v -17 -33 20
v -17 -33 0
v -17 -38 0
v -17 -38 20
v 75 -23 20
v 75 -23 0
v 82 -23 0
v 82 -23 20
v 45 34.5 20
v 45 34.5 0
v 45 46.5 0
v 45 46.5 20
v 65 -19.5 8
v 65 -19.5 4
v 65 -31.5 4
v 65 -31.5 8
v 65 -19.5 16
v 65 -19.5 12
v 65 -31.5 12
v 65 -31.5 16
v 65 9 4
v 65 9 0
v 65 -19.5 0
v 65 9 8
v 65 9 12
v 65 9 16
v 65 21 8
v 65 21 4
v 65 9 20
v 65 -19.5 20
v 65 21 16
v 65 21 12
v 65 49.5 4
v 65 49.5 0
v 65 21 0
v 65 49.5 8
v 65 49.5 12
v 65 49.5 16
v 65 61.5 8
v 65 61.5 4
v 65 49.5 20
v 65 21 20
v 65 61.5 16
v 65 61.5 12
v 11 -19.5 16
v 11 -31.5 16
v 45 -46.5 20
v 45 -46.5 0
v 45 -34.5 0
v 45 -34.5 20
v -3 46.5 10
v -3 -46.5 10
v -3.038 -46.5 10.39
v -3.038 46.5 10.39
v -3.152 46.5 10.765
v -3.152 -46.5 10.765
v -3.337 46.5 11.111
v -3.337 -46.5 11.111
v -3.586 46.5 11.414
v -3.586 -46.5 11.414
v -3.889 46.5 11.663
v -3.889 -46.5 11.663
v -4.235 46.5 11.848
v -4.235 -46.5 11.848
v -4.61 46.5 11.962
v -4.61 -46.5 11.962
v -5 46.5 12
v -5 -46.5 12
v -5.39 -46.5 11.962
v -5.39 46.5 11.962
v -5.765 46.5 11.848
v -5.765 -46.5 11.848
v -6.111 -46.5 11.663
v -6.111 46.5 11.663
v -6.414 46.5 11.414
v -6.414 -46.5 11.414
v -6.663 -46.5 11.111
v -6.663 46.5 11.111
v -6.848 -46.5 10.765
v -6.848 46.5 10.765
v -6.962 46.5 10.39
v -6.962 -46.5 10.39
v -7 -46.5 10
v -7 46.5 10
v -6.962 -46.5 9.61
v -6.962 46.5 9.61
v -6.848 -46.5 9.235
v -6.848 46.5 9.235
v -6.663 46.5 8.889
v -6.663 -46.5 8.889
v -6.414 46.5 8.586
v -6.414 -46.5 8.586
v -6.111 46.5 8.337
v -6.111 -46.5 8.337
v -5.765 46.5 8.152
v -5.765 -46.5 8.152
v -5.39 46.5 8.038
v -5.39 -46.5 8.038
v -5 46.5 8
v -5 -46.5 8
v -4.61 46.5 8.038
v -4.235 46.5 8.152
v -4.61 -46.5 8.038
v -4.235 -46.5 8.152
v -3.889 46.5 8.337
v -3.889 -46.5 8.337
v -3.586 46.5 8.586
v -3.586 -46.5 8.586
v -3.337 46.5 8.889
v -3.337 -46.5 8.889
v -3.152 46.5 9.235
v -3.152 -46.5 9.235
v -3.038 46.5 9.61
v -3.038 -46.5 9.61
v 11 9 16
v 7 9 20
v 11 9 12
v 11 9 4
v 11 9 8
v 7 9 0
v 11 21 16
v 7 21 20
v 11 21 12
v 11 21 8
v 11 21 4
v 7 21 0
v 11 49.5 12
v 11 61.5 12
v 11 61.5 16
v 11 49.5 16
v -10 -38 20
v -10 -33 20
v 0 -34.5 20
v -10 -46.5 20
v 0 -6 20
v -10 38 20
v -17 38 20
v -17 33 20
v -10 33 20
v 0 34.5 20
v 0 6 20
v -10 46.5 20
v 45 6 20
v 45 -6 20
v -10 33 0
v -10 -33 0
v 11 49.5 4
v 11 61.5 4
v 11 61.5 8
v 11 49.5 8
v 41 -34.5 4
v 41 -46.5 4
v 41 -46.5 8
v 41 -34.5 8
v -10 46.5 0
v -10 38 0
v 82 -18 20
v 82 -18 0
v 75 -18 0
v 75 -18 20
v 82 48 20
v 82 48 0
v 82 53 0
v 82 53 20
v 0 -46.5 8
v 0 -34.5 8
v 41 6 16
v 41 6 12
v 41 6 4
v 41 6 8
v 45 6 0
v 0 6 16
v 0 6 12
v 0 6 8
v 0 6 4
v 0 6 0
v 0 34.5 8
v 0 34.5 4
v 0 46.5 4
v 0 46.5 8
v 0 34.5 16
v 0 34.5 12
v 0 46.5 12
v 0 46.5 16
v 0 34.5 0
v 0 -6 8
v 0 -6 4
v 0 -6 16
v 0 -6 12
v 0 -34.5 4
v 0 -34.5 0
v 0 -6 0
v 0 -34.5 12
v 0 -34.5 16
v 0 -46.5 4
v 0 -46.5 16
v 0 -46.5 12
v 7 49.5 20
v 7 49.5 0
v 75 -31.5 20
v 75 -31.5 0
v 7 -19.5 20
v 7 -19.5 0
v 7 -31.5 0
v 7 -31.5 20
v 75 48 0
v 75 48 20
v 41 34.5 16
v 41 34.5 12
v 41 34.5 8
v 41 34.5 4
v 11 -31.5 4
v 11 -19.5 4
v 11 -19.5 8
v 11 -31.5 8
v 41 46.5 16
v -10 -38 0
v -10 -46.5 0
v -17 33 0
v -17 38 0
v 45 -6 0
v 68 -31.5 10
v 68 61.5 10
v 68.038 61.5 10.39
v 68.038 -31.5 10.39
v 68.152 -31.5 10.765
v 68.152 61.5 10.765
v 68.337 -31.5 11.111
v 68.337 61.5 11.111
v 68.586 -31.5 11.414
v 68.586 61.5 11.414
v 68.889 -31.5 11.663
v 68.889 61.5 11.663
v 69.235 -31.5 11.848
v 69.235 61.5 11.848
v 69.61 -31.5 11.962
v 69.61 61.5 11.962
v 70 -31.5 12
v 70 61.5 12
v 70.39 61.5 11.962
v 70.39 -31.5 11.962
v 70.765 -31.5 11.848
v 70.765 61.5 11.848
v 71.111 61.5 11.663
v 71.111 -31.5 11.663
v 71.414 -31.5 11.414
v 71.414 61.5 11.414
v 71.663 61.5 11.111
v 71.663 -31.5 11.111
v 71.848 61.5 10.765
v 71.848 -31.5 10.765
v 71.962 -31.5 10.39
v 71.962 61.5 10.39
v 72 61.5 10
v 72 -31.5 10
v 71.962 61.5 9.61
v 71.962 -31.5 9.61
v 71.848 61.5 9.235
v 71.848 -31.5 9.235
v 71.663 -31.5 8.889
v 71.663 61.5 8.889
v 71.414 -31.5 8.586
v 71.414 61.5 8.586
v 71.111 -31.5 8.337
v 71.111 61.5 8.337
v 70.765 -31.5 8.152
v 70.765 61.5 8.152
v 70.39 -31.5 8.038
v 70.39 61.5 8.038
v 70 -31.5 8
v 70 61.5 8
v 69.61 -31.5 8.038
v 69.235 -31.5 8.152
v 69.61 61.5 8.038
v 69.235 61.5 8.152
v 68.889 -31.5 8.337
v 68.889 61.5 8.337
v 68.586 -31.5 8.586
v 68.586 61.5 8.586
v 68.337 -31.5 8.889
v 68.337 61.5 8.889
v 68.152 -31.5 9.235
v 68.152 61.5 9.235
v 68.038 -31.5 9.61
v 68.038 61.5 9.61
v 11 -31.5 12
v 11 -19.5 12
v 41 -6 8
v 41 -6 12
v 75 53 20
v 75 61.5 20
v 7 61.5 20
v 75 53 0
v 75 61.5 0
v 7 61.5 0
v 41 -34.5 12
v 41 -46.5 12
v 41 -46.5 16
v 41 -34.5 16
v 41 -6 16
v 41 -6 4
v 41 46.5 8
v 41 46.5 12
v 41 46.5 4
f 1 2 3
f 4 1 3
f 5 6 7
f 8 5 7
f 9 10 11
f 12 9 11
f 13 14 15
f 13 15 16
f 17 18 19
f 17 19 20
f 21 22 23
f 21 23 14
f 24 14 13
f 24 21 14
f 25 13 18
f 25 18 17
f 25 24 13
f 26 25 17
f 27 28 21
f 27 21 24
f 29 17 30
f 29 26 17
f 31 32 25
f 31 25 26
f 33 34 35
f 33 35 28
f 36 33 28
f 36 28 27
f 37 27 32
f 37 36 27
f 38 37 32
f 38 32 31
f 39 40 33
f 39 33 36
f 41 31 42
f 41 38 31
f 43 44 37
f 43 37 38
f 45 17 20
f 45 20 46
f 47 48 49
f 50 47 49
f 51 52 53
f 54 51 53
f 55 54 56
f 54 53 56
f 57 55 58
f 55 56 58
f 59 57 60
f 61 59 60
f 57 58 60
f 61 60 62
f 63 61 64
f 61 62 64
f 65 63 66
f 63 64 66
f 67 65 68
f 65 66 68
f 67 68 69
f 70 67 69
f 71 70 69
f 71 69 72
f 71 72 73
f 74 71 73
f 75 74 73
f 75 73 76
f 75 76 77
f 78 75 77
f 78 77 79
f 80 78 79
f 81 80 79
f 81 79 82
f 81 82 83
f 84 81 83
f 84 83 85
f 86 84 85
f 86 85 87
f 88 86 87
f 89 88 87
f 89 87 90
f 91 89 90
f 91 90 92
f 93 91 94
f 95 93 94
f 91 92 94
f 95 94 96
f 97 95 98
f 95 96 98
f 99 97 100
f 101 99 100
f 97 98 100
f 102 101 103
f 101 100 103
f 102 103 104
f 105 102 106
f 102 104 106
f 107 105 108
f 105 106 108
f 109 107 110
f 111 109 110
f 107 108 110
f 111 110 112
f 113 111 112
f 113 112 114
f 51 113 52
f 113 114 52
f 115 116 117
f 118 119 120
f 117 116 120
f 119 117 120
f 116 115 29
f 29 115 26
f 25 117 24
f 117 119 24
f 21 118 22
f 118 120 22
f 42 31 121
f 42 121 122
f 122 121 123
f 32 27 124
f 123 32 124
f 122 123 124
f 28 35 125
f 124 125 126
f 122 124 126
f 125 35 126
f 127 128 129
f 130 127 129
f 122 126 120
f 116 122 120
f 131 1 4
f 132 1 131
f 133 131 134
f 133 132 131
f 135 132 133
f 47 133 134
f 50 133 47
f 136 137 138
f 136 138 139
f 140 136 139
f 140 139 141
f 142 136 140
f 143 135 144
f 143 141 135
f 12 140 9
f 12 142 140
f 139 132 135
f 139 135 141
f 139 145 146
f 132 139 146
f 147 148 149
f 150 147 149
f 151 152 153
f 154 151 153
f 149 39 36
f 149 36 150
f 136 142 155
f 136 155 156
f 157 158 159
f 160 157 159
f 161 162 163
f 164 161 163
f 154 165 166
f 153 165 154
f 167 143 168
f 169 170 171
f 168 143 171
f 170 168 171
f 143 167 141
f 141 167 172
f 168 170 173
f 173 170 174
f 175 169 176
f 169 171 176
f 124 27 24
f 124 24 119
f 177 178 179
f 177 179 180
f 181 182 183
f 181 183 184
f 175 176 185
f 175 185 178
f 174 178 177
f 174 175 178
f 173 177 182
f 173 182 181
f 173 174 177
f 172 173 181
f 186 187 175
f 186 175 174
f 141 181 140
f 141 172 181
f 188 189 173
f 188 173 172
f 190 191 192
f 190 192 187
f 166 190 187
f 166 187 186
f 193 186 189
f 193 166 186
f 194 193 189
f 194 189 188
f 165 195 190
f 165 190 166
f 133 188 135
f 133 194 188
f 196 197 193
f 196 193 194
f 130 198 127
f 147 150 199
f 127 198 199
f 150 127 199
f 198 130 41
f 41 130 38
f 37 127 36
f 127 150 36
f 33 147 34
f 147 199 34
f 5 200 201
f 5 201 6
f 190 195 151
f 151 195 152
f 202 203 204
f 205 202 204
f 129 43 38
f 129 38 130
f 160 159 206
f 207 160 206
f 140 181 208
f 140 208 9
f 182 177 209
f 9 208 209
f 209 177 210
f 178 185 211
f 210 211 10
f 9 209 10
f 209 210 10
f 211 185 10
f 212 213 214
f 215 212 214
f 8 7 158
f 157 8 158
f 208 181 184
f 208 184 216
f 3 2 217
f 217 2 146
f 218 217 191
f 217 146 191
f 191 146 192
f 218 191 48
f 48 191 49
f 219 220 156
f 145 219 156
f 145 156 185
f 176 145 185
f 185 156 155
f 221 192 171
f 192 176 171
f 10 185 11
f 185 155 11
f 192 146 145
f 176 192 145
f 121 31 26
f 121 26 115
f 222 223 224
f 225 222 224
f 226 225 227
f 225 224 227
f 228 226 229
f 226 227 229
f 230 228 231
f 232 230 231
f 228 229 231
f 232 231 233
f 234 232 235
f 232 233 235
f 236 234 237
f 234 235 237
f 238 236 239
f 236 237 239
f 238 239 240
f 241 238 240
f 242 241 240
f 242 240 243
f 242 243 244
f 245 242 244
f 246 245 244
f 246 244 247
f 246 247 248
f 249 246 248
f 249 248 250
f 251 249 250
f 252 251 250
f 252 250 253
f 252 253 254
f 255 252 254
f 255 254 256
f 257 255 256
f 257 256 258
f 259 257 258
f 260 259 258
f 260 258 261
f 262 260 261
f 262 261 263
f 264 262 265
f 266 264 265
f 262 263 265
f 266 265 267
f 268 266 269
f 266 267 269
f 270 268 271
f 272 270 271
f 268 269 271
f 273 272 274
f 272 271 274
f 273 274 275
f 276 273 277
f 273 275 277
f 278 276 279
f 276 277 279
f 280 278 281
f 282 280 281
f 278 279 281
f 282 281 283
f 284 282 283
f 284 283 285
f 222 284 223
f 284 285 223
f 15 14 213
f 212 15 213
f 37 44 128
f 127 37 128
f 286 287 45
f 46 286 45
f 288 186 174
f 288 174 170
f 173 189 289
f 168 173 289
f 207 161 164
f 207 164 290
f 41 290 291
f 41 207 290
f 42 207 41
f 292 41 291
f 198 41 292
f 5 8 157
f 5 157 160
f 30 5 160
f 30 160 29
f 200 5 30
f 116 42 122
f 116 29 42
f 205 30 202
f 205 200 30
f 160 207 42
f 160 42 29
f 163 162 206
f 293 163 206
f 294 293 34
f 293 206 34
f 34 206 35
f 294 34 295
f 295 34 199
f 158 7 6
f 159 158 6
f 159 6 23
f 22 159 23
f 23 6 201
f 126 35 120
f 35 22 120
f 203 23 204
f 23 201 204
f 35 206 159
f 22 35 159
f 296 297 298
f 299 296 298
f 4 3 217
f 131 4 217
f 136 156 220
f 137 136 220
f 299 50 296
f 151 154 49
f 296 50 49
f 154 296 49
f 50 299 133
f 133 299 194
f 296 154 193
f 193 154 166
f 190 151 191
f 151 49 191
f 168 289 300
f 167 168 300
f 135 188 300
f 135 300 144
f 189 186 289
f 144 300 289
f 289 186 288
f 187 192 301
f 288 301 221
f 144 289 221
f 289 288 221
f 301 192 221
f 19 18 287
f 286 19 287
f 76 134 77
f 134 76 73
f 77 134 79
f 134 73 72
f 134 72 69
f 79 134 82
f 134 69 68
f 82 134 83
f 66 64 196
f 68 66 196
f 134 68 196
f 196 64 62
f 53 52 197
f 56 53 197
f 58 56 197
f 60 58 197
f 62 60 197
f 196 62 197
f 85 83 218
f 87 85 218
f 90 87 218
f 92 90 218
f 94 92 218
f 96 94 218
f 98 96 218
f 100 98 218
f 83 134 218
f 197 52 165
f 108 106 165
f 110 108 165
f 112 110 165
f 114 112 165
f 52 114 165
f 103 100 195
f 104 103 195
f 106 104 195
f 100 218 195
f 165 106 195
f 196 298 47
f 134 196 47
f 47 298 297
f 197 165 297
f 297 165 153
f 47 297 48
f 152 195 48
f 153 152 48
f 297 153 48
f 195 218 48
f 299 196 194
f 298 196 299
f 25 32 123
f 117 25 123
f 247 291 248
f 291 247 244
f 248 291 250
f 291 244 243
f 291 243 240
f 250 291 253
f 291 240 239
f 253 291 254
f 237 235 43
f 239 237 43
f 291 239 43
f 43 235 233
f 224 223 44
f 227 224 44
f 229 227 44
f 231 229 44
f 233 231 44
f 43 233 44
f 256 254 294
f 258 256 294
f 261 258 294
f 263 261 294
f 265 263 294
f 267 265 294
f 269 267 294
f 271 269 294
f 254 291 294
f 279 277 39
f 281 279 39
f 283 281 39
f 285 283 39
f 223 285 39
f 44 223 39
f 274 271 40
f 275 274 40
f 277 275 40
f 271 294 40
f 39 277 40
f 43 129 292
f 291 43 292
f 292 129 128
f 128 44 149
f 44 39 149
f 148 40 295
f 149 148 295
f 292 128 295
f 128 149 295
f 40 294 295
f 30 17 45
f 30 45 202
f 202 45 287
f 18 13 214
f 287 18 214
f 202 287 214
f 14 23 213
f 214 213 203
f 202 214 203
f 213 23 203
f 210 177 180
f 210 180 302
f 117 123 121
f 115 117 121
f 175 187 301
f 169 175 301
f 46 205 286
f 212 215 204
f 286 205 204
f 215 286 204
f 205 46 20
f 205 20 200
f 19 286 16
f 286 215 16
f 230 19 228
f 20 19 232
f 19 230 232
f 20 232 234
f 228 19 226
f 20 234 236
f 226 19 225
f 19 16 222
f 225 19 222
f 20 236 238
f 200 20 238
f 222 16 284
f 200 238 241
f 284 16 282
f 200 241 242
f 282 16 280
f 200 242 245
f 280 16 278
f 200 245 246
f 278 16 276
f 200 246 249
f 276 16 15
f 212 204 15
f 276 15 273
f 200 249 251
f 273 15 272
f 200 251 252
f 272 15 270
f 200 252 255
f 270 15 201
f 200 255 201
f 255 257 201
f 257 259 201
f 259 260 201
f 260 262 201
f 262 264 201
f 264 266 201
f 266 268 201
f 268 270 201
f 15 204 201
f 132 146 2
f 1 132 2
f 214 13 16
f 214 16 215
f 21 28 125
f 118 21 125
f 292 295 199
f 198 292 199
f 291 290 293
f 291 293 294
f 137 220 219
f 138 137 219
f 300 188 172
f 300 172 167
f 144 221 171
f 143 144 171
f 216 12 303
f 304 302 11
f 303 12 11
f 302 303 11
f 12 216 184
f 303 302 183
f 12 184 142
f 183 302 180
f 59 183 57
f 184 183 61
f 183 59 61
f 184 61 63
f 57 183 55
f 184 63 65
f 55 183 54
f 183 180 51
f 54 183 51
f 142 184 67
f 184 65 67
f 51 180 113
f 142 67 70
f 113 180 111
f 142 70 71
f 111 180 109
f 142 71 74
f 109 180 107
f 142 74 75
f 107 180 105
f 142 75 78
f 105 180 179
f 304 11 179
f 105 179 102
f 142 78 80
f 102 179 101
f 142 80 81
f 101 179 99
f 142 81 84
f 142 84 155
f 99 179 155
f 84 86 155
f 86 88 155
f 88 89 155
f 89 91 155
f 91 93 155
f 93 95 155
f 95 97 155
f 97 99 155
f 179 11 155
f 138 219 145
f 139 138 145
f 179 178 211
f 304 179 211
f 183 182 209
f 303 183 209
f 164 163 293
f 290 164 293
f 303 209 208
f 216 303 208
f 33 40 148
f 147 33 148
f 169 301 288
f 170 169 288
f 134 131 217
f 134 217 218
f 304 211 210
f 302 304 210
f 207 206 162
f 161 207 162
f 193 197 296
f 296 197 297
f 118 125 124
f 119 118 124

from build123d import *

# Parameters (mm, degrees)
PAD_DEPTH       = 20
SKETCH001_R     = 2
SKETCH001_W     = 41
SKETCH001_H     = 4
POCKET_DEPTH    = 93.001
PAD001_DEPTH    = 20
SKETCH003_R     = 2
SKETCH003_W     = 54
SKETCH003_H     = 4
POCKET001_DEPTH = 93.001


with BuildPart() as soporte_aligerado:
    # Sketch → Pad (new body)
    with BuildSketch(Plane.XY):
        Polygon((-10, -46.5), (45, -46.5), (45, -34.5), (0, -34.5), (0, -6), (45, -6), (45, 6), (0, 6), (0, 34.5), (45, 34.5), (45, 46.5), (-10, 46.5), (-10, 38), (-17, 38), (-17, 33), (-10, 33), (-10, -33), (-17, -33), (-17, -38), (-10, -38), align=None)
    extrude(amount=PAD_DEPTH)

    # Sketch001 → Pocket (cut, through all)
    with BuildSketch(Plane.XZ.offset(46.5)):
        with Locations((-5, 10)):
            Circle(SKETCH001_R)
        with Locations((20.5, 14)):
            Rectangle(SKETCH001_W, SKETCH001_H)
        with Locations((20.5, 6)):
            Rectangle(SKETCH001_W, SKETCH001_H)
    extrude(amount=-POCKET_DEPTH, mode=Mode.SUBTRACT)


with BuildPart() as soporte_aligerado001:
    # Sketch002 → Pad001 (new body)
    with BuildSketch(Plane(origin=(65, 15, 0), x_dir=(-1, 0, 0), z_dir=(0, 0, 1))):
        Polygon((-10, -46.5), (58, -46.5), (58, -34.5), (0, -34.5), (0, -6), (58, -6), (58, 6), (0, 6), (0, 34.5), (58, 34.5), (58, 46.5), (-10, 46.5), (-10, 38), (-17, 38), (-17, 33), (-10, 33), (-10, -33), (-17, -33), (-17, -38), (-10, -38), align=None)
    extrude(amount=PAD001_DEPTH)

    # Sketch003 → Pocket001 (cut, through all)
    with BuildSketch(Plane(origin=(65, 61.5, 0), x_dir=(-1, 0, 0), z_dir=(0, 1, 0))):
        with Locations((-5, 10)):
            Circle(SKETCH003_R)
        with Locations((27, 14)):
            Rectangle(SKETCH003_W, SKETCH003_H)
        with Locations((27, 6)):
            Rectangle(SKETCH003_W, SKETCH003_H)
    extrude(amount=-POCKET001_DEPTH, mode=Mode.SUBTRACT)


solid = Compound([soporte_aligerado.part, soporte_aligerado001.part])
